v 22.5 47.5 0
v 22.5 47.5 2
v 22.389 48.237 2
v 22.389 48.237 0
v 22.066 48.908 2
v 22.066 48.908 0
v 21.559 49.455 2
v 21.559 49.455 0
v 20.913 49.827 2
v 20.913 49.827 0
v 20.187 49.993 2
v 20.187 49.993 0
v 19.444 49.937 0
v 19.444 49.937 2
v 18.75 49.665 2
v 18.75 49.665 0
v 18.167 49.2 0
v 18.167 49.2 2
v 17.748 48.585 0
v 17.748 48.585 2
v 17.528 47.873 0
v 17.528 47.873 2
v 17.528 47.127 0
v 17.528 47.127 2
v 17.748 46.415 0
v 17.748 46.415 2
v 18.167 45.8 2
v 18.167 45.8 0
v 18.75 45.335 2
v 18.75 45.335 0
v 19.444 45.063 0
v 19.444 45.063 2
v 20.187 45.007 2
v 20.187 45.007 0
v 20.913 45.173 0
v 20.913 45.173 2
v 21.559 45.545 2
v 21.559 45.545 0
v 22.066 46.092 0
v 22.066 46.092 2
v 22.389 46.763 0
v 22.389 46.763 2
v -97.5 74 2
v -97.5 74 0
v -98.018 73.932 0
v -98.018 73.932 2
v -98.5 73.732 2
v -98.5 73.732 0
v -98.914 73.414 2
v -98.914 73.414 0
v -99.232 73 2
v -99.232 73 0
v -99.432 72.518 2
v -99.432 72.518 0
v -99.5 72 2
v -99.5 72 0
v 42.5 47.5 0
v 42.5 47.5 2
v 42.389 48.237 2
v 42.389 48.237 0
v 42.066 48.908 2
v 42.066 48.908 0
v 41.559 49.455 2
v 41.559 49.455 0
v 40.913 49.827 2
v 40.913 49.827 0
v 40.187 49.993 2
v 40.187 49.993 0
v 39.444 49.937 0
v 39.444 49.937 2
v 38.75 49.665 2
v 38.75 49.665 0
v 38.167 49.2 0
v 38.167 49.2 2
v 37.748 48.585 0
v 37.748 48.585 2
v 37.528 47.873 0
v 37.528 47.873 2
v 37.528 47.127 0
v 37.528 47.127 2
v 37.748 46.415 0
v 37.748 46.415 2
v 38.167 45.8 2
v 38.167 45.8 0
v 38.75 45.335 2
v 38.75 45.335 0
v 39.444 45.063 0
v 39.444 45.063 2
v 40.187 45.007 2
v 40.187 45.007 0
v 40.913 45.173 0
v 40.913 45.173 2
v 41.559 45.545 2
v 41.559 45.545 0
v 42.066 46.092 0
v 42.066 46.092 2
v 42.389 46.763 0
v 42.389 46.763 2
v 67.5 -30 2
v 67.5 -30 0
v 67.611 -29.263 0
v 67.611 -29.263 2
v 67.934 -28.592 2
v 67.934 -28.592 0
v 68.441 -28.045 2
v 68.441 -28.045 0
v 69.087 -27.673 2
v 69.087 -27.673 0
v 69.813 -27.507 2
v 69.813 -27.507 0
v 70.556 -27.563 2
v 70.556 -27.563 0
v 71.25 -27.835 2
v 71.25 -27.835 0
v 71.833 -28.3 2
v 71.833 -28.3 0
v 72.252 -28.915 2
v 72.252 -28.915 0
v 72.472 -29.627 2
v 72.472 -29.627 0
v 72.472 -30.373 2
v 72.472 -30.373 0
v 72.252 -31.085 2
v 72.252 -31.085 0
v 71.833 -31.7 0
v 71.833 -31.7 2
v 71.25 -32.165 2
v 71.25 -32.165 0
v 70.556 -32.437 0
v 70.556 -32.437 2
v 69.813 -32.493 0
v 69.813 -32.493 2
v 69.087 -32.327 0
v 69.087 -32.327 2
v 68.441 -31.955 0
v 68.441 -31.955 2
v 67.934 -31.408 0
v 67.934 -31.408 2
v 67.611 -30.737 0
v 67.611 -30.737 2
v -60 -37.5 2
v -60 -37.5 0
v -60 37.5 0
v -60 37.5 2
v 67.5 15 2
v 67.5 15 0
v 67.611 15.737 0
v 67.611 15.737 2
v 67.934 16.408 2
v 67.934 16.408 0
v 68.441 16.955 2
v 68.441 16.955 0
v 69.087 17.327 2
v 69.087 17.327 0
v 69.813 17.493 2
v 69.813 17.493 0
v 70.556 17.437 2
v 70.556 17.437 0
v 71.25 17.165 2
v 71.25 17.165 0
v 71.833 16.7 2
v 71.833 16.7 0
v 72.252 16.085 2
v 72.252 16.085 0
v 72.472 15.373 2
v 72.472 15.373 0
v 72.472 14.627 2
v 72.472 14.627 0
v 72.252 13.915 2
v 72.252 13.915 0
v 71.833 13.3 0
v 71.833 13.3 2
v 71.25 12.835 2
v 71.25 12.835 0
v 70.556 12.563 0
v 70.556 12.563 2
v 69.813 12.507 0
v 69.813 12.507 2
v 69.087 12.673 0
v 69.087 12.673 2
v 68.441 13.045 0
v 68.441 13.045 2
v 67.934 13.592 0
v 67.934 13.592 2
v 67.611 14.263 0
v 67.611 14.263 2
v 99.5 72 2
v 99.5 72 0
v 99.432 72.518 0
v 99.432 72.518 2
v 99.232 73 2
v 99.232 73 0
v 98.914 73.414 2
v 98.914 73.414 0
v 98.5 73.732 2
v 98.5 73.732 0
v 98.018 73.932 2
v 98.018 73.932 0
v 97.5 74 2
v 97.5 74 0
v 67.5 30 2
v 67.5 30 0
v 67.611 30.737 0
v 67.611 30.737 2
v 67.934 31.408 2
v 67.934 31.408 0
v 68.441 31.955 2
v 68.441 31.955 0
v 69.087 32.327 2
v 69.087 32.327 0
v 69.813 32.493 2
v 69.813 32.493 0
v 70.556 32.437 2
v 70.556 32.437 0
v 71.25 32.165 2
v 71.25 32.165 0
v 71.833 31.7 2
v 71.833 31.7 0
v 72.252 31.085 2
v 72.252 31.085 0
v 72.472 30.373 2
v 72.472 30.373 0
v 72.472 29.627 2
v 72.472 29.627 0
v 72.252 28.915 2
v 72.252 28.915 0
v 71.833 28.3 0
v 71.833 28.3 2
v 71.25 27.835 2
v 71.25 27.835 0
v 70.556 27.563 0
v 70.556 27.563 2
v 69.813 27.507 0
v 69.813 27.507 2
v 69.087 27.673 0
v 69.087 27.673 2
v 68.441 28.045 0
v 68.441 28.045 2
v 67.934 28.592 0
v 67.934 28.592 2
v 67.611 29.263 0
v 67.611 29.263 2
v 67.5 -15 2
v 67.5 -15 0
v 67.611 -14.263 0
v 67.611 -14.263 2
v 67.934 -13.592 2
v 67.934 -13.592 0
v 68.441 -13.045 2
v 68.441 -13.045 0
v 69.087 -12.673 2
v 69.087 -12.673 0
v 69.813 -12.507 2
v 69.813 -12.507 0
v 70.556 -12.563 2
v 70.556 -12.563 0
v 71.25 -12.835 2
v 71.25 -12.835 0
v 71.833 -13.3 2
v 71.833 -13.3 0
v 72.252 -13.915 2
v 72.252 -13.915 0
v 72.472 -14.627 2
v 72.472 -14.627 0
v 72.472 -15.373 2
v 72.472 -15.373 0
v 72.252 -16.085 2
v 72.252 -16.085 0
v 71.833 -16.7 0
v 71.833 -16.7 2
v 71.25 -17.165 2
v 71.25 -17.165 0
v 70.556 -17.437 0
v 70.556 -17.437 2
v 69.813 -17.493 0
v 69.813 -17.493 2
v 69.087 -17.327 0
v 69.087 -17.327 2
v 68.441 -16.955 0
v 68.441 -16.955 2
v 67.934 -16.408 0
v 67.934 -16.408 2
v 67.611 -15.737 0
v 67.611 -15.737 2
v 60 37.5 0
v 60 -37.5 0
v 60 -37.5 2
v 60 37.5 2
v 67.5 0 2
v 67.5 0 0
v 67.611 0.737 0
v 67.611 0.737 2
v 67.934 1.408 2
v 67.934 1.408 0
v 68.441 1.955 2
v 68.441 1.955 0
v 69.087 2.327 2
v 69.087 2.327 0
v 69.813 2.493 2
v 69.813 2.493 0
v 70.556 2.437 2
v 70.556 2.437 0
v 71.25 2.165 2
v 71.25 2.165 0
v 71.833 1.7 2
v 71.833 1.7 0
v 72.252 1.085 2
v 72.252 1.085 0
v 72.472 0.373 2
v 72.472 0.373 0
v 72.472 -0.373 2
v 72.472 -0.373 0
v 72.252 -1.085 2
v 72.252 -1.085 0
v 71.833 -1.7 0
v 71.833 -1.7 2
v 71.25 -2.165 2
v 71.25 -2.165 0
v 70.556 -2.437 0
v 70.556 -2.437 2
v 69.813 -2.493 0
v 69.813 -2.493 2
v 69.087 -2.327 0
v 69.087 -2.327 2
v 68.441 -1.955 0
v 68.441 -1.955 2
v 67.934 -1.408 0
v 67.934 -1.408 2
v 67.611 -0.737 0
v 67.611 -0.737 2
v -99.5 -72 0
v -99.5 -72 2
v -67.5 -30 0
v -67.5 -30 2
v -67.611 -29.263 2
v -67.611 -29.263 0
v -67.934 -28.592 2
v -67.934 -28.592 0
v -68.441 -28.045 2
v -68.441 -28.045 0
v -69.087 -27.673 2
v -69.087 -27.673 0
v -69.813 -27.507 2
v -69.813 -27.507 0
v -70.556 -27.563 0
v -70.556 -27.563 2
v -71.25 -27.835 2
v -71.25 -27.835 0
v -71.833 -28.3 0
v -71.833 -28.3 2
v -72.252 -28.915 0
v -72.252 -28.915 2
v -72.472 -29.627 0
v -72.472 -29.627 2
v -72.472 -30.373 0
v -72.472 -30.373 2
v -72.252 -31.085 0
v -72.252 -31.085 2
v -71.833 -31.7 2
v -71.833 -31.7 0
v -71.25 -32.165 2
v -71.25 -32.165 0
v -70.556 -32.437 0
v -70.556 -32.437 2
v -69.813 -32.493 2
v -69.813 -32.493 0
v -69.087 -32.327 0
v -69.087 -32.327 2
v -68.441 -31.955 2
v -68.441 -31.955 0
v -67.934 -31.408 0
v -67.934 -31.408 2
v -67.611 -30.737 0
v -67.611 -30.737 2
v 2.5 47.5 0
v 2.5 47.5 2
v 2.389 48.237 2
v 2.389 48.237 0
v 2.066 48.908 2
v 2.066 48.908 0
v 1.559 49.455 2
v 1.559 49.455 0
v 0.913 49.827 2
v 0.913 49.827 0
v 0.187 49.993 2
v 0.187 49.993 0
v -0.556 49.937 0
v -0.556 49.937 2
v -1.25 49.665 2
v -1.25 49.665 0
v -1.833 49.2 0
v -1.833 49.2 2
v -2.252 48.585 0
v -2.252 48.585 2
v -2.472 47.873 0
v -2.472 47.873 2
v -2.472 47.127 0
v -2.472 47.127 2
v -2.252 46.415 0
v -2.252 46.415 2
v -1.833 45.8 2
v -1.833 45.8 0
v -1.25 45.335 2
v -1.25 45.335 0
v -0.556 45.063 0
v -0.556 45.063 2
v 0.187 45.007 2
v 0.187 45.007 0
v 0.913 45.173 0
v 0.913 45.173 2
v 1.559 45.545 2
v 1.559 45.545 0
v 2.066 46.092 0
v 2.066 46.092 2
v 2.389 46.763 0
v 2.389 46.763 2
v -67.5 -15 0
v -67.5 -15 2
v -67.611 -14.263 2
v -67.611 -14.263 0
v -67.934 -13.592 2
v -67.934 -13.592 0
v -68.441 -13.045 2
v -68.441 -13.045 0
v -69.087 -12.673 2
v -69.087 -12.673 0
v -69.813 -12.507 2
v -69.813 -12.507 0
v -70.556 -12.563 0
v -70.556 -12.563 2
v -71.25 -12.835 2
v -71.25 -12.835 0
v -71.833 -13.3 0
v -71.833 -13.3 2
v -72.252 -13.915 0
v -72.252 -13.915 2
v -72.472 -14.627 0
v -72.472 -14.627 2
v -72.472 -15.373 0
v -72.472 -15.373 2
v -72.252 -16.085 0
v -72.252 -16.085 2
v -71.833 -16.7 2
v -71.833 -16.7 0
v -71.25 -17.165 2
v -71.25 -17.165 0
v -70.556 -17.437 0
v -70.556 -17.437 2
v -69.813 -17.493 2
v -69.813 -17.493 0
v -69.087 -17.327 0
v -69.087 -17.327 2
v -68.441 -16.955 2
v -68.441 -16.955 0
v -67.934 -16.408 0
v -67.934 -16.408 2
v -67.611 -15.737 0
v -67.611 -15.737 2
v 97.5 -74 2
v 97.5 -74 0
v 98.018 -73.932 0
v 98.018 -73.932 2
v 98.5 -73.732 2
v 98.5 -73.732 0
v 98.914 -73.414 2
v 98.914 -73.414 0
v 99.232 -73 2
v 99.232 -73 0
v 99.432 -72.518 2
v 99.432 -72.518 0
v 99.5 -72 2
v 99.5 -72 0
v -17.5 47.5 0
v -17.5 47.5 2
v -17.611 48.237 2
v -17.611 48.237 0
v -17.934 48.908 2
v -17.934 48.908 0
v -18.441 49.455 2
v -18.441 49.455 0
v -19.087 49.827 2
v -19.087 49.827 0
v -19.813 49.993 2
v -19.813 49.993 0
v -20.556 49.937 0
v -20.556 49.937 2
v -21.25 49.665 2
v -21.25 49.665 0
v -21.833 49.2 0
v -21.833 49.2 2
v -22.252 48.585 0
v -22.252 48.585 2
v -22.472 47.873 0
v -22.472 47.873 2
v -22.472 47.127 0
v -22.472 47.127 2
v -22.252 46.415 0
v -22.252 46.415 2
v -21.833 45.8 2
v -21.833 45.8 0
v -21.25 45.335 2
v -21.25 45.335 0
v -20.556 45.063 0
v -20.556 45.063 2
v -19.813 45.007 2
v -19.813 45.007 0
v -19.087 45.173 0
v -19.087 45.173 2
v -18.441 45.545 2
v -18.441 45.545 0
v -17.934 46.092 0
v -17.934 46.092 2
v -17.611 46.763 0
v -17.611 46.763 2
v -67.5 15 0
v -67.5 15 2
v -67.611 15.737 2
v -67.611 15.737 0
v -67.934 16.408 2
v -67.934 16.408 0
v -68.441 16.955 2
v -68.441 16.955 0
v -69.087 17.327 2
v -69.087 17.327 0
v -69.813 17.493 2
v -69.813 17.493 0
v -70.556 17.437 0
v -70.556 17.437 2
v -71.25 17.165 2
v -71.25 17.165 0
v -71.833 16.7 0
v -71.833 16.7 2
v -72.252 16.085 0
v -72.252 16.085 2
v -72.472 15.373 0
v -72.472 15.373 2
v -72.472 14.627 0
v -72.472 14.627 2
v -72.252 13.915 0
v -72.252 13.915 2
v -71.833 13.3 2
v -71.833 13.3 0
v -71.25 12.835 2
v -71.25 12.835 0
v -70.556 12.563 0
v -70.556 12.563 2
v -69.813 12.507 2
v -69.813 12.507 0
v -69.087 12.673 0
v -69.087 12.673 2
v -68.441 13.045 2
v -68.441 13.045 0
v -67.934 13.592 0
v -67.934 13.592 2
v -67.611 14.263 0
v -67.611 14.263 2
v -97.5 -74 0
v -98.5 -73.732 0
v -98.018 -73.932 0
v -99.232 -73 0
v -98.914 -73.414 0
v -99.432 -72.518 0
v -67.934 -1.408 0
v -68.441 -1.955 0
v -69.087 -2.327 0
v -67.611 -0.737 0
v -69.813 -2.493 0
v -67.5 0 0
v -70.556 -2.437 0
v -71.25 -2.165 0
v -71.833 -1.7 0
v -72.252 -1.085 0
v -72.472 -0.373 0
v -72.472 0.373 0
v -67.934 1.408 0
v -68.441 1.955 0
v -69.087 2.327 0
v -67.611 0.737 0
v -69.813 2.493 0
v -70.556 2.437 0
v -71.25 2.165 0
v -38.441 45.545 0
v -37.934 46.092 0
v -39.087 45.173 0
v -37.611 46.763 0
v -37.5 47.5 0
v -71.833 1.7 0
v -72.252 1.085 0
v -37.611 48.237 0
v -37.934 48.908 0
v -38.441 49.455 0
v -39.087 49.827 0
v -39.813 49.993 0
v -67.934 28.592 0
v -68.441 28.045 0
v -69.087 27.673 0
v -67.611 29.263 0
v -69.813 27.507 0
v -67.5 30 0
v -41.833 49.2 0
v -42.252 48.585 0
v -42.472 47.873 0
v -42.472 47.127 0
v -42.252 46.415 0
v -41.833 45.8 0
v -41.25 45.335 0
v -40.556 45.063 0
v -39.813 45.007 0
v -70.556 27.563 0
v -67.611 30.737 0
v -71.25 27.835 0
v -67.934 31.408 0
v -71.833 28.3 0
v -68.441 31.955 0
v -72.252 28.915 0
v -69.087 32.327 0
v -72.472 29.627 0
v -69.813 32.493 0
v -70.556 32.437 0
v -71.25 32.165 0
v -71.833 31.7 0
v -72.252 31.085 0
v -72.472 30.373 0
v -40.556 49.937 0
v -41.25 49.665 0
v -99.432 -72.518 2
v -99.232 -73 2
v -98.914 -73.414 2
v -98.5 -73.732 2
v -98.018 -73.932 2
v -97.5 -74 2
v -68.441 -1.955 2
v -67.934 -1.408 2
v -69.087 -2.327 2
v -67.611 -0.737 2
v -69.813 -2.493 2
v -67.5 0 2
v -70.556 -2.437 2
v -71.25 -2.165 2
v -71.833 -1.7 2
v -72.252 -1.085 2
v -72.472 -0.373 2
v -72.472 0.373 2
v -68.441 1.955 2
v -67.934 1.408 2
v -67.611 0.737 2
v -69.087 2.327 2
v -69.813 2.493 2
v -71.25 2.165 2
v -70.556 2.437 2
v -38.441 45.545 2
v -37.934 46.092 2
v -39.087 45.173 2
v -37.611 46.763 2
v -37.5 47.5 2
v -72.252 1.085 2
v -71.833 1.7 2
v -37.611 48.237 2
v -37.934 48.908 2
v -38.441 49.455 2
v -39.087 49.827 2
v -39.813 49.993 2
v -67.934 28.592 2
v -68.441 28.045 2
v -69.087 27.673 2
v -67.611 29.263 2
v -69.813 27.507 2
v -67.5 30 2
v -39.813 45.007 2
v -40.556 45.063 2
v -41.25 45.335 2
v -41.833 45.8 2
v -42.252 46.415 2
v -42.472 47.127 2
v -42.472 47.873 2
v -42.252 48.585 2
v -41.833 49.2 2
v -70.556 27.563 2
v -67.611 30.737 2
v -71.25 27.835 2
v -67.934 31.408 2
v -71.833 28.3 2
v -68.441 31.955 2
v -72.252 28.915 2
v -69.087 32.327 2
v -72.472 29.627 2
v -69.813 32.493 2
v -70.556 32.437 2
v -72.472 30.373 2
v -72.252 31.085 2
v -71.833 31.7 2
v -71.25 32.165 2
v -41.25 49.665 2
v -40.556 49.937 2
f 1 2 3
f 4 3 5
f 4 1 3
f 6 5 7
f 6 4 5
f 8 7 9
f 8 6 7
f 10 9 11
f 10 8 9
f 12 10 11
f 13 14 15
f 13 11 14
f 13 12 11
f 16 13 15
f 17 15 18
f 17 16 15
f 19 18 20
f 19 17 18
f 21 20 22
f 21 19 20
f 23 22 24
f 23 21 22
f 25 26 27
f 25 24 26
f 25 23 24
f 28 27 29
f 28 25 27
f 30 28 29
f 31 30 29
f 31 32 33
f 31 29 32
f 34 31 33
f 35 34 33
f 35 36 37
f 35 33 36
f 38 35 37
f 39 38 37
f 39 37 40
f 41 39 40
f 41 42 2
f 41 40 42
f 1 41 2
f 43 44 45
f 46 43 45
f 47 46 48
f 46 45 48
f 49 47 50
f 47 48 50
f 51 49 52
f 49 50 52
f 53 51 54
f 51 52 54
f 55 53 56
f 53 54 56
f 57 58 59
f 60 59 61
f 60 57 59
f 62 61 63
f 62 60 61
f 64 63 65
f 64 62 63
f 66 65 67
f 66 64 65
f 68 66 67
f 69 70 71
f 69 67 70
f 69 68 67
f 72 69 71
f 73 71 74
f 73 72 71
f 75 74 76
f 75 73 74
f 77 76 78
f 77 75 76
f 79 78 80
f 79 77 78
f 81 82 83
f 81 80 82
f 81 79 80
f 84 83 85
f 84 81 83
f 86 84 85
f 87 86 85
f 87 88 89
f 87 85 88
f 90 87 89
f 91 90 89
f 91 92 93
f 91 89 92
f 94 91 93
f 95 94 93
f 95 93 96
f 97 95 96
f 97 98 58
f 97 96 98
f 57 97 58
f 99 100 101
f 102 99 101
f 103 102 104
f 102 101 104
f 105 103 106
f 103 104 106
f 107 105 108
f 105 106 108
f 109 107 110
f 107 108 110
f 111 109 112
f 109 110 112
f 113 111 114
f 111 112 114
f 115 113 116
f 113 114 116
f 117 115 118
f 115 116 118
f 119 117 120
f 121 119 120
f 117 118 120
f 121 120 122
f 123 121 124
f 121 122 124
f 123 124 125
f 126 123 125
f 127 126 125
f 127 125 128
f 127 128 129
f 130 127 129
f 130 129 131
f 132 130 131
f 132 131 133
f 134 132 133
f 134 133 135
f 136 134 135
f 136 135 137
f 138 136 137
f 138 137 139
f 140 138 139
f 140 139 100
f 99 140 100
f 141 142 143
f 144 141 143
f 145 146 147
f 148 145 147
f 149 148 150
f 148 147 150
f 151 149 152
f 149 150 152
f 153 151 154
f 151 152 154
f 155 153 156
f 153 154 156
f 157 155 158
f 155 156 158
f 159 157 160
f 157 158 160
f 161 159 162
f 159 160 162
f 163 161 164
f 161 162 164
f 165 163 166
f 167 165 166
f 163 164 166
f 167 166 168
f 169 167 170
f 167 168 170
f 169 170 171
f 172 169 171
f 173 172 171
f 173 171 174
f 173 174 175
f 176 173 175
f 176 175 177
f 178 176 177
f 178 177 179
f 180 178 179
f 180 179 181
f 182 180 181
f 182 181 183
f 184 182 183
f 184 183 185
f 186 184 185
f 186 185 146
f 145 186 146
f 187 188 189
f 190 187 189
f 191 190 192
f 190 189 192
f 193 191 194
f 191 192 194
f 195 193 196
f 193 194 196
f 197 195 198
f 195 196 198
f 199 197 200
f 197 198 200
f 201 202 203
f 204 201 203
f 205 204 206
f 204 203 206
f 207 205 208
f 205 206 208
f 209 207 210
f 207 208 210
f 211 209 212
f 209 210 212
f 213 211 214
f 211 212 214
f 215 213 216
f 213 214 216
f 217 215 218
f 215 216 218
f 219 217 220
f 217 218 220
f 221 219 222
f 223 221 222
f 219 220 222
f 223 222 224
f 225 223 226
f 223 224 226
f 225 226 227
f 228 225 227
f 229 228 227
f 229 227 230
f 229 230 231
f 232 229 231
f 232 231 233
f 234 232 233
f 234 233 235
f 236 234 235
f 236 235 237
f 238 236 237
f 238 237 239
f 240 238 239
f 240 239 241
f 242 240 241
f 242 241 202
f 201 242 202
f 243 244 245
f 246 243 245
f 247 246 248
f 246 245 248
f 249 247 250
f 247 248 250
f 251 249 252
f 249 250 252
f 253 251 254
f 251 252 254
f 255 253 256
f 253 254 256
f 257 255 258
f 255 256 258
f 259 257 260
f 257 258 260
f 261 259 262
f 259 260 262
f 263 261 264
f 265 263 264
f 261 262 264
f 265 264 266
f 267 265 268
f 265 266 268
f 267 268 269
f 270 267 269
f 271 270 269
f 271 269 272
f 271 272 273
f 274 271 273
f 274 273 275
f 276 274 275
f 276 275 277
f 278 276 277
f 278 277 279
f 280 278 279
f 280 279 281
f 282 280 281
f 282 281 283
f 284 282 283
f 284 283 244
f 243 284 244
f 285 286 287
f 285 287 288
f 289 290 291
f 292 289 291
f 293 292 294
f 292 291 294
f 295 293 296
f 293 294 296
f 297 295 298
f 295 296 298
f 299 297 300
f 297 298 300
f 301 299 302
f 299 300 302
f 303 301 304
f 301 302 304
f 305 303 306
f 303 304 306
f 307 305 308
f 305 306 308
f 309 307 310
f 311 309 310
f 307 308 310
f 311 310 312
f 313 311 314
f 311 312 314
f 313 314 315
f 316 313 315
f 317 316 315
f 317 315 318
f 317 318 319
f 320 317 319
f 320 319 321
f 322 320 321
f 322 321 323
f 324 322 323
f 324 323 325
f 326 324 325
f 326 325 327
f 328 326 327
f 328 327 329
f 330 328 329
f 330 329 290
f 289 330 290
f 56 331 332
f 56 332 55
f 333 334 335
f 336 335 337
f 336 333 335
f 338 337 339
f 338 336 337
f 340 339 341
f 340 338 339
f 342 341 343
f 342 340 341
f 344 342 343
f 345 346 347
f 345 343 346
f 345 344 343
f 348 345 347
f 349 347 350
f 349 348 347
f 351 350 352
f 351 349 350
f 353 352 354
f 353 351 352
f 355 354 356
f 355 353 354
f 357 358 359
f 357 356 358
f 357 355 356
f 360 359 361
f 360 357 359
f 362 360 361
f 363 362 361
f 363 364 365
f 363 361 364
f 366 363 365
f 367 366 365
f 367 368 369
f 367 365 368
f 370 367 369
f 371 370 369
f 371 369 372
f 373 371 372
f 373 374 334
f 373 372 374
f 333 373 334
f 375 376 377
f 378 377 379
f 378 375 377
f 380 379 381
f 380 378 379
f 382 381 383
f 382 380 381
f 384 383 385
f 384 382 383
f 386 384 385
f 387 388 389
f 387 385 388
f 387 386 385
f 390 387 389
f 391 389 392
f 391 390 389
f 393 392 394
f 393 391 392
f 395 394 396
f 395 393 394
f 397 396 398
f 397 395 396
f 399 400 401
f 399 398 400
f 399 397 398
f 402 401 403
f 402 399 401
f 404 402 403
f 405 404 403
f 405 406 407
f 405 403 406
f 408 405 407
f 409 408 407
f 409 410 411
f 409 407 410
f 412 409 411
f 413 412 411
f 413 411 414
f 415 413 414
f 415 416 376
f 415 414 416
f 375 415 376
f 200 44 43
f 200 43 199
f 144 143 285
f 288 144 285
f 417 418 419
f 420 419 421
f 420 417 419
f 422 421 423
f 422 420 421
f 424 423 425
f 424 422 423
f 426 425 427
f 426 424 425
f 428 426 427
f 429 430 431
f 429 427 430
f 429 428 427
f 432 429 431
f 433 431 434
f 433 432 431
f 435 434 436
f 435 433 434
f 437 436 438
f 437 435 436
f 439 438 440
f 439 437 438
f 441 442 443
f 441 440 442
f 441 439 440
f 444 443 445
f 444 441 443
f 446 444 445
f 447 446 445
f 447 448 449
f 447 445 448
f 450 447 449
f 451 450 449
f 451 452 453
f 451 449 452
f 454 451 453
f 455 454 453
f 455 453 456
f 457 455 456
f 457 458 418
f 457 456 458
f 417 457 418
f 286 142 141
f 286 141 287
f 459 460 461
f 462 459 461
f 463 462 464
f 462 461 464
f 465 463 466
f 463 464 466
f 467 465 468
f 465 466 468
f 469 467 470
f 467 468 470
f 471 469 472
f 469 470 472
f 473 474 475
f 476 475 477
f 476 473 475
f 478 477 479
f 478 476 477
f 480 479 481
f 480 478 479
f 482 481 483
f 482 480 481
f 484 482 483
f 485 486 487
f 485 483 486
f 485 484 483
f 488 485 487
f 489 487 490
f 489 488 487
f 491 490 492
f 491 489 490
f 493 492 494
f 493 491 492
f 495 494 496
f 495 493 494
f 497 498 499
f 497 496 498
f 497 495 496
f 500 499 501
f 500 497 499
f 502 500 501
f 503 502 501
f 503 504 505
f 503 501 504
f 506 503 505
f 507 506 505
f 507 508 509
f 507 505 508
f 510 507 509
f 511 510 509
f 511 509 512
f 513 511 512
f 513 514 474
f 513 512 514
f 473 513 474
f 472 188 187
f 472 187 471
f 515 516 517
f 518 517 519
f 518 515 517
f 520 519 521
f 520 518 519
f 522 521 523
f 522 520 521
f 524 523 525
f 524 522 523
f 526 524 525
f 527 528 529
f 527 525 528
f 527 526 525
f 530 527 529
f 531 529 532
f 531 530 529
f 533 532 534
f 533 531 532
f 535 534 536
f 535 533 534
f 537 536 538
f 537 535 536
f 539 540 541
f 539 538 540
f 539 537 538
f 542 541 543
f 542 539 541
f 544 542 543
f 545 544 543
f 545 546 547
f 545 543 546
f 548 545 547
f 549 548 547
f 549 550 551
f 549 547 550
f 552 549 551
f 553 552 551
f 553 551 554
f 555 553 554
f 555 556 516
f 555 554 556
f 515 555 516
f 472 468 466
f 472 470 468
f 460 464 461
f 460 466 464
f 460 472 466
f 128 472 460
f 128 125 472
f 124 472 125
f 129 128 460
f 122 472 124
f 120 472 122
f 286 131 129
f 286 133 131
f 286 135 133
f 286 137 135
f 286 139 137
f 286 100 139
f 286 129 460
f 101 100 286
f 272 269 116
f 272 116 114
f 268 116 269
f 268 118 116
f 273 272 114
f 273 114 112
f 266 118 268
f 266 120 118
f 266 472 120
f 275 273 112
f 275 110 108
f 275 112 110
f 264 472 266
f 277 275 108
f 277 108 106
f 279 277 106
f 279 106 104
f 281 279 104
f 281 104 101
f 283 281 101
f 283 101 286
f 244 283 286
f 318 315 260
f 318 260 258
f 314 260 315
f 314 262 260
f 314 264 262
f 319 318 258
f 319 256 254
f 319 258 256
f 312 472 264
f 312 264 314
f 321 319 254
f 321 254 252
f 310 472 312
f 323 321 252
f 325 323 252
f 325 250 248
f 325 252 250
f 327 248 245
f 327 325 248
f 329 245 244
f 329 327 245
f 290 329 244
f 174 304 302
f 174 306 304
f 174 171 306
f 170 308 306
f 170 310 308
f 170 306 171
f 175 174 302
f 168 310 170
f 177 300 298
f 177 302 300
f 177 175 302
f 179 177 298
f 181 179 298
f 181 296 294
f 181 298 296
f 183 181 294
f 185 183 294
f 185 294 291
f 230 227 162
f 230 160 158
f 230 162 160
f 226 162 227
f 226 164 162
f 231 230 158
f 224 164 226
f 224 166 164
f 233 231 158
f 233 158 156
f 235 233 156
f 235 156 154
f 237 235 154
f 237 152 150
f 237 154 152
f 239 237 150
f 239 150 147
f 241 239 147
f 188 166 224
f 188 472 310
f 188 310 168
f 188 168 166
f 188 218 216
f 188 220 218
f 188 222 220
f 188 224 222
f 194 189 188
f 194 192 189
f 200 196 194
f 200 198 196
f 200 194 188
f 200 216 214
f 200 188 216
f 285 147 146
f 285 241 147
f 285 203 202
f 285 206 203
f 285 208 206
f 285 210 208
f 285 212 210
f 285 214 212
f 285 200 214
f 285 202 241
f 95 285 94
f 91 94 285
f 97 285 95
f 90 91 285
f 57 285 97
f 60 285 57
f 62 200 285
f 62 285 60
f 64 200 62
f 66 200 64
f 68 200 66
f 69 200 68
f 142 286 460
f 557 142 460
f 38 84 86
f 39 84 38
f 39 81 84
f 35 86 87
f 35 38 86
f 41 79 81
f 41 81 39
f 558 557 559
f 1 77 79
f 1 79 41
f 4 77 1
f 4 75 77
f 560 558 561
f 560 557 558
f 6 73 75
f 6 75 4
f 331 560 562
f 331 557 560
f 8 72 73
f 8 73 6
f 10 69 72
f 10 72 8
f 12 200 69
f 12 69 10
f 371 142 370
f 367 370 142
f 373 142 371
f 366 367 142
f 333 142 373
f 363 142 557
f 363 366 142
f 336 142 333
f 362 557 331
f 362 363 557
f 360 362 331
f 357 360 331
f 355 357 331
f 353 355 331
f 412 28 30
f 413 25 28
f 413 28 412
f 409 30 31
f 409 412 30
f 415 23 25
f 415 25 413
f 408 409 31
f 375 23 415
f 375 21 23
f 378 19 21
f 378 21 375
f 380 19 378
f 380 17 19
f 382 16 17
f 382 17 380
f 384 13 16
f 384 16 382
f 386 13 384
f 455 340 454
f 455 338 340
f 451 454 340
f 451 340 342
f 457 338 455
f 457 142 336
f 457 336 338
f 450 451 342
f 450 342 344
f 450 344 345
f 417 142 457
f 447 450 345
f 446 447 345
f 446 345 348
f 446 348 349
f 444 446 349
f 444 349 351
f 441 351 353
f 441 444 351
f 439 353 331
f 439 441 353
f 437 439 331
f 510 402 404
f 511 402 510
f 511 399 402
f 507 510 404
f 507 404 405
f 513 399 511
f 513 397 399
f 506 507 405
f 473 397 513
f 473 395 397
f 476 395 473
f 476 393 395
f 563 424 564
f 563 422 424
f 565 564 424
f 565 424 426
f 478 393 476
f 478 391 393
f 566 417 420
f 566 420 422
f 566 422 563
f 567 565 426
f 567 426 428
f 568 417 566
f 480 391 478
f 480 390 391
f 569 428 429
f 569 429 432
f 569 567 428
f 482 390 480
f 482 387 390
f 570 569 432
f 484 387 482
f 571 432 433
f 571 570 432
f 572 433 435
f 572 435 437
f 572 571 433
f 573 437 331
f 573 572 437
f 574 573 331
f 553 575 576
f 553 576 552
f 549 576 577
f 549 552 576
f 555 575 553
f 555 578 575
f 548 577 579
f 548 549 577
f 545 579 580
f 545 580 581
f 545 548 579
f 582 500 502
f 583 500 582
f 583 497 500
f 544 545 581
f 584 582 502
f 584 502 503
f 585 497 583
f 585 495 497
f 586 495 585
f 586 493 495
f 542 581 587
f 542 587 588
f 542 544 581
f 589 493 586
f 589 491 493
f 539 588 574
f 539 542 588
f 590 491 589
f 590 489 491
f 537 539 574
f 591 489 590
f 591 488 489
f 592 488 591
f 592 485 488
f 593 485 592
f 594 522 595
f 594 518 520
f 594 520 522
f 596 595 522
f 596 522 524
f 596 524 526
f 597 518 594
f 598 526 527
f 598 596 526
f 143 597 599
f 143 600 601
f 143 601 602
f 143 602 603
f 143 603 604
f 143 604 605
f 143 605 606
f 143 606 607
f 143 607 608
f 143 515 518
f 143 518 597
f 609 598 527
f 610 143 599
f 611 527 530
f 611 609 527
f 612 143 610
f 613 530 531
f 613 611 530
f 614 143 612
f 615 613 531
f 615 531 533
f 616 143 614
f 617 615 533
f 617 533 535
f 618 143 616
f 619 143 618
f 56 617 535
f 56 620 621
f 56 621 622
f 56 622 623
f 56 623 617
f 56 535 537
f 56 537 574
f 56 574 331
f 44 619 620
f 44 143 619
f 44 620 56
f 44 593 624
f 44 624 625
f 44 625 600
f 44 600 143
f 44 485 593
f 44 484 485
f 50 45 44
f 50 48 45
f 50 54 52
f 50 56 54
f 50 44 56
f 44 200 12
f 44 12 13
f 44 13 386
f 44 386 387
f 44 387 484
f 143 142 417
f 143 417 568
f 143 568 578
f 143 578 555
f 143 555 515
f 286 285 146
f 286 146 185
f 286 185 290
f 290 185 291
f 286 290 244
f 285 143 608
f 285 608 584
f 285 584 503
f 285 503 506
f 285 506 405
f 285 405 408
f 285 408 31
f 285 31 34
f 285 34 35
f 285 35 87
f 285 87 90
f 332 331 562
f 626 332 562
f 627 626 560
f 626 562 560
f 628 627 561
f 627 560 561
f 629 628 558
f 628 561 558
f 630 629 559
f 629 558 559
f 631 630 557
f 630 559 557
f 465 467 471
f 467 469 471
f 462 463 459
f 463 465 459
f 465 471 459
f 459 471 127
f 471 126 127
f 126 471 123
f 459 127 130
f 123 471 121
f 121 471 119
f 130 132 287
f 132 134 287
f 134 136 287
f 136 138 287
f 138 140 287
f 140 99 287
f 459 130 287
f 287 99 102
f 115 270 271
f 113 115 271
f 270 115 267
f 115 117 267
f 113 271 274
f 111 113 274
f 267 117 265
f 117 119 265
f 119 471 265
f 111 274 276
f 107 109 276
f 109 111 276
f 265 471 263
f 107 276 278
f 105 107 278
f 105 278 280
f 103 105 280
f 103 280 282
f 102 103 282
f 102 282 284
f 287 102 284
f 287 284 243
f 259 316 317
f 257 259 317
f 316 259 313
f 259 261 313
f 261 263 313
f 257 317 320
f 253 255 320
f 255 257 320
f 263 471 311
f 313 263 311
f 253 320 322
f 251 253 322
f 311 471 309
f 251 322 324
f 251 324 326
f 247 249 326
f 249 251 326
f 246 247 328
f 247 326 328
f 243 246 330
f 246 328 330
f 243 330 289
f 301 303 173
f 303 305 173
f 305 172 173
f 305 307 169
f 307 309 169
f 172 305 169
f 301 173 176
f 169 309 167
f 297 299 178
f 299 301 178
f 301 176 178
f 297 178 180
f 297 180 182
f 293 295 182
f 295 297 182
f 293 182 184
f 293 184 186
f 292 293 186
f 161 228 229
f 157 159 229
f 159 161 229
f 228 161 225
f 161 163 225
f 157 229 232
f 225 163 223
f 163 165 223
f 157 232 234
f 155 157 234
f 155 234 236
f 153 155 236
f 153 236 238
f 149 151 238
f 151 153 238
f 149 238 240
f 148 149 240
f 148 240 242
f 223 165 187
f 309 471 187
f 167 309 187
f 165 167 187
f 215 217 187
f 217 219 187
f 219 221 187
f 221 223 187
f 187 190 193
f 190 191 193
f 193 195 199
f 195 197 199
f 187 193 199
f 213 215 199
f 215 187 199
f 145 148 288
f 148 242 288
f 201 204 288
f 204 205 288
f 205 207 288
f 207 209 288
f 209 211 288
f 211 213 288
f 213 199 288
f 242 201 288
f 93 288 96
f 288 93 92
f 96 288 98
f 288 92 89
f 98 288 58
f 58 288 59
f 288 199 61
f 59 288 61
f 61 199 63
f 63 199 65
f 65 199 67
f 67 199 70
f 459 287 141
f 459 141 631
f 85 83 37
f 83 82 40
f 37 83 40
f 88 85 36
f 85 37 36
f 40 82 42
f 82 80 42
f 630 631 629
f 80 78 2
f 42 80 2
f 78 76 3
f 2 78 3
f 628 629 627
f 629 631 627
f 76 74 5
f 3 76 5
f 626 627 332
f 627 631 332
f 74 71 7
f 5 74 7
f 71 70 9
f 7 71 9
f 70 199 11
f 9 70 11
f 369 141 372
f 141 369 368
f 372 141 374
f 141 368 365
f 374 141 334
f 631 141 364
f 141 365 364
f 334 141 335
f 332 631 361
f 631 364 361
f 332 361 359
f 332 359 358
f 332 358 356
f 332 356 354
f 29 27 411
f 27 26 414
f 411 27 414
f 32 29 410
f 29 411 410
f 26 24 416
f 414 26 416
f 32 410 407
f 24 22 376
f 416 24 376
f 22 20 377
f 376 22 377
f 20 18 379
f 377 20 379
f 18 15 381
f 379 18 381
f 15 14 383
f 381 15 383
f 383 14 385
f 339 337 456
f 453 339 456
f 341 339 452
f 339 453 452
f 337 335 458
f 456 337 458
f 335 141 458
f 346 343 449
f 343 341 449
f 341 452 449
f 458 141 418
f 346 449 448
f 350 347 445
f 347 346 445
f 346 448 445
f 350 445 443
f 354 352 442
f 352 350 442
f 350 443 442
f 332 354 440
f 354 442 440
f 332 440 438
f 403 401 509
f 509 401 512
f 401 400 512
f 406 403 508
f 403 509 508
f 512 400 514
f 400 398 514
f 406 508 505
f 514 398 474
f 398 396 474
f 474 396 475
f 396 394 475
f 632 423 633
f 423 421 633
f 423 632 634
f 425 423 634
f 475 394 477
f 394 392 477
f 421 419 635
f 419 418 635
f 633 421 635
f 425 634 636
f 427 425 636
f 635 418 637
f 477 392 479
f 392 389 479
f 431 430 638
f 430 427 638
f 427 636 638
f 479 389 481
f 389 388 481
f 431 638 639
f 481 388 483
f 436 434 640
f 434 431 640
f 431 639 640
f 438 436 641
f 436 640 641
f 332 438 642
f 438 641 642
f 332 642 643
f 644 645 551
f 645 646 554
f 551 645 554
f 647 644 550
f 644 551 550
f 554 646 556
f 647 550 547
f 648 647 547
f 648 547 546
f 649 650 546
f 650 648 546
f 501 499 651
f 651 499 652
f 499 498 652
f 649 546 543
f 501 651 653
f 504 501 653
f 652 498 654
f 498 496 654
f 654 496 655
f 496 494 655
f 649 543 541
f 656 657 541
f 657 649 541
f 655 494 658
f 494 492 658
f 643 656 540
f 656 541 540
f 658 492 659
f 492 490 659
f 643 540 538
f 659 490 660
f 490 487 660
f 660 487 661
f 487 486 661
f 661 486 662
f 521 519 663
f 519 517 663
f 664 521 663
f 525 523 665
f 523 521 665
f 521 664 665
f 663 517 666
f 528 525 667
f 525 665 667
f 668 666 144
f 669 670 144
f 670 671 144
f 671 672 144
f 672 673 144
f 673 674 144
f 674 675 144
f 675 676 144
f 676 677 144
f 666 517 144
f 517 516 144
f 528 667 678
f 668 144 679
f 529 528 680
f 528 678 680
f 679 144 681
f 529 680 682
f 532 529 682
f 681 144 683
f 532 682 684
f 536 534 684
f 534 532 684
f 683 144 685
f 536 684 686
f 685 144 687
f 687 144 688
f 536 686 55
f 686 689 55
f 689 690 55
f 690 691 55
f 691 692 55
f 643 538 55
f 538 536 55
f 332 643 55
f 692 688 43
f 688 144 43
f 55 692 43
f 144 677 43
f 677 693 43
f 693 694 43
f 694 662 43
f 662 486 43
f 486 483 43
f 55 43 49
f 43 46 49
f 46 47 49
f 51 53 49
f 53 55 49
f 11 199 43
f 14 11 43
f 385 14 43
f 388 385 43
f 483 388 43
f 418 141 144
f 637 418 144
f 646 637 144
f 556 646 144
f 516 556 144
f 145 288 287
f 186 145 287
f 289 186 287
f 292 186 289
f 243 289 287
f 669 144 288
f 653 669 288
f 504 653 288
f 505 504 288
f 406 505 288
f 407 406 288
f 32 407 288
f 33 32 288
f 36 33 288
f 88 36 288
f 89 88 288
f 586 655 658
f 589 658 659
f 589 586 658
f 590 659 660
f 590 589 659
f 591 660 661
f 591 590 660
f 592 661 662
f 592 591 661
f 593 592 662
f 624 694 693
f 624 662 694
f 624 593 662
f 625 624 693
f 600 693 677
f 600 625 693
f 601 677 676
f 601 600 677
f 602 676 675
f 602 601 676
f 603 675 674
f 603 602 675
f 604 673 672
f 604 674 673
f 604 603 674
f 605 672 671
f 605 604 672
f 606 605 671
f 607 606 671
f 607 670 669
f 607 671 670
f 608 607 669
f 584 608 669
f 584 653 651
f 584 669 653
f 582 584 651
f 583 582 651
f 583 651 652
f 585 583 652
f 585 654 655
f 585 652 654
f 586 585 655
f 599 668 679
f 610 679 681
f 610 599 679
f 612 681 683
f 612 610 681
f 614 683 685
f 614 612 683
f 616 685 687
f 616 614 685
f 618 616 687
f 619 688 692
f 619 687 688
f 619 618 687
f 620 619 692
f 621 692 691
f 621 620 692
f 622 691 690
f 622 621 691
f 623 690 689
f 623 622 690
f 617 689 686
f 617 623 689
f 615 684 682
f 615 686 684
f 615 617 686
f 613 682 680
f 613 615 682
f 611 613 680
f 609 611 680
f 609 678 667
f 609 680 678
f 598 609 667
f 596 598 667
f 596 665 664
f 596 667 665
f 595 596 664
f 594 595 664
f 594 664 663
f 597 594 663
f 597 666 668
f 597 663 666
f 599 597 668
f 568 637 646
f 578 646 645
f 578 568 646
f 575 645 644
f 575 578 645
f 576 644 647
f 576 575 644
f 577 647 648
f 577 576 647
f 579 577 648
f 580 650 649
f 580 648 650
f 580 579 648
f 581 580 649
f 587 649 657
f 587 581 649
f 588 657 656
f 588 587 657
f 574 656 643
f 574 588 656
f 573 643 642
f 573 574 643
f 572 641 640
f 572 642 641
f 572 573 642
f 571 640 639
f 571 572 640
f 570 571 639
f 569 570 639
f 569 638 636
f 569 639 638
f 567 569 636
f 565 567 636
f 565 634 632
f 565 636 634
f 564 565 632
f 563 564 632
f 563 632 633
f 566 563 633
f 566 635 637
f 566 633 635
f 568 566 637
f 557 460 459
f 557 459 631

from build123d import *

# Parameters (mm, degrees)
PAD_DEPTH       = 2
SKETCH001_W     = 120
SKETCH001_H     = 75
POCKET_DEPTH    = 7
SKETCH002_R     = 2.5
POCKET001_DEPTH = 7
SKETCH003_R     = 2.5
POCKET002_DEPTH = 7


with BuildPart() as part:
    # Sketch → Pad (new body)
    with BuildSketch(Plane.XY):
        with BuildLine():
            Line((-97.5, 74), (97.5, 74))
            ThreePointArc((99.5, 72), (98.914214, 73.414214), (97.5, 74))
            Line((99.5, 72), (99.5, -72))
            ThreePointArc((97.5, -74), (98.914214, -73.414214), (99.5, -72))
            Line((97.5, -74), (-97.5, -74))
            ThreePointArc((-99.5, -72), (-98.914214, -73.414214), (-97.5, -74))
            Line((-99.5, -72), (-99.5, 72))
            ThreePointArc((-97.5, 74), (-98.914214, 73.414214), (-99.5, 72))
        make_face()
    extrude(amount=PAD_DEPTH)

    # Sketch001 → Pocket (cut)
    with BuildSketch(Plane.XY):
        Rectangle(SKETCH001_W, SKETCH001_H)
    extrude(amount=POCKET_DEPTH, mode=Mode.SUBTRACT)

    # Sketch002 → Pocket001 (cut)
    with BuildSketch(Plane.XY):
        with Locations((0, 47.5)):
            Circle(SKETCH002_R)
        with Locations((-40, 47.5)):
            Circle(SKETCH002_R)
        with Locations((-20, 47.5)):
            Circle(SKETCH002_R)
        with Locations((20, 47.5)):
            Circle(SKETCH002_R)
        with Locations((40, 47.5)):
            Circle(SKETCH002_R)
    extrude(amount=POCKET001_DEPTH, mode=Mode.SUBTRACT)

    # Sketch003 → Pocket002 (cut)
    with BuildSketch(Plane.XY):
        with Locations((-70, 0)):
            Circle(SKETCH003_R)
        with Locations((-70, 15)):
            Circle(SKETCH003_R)
        with Locations((-70, 30)):
            Circle(SKETCH003_R)
        with Locations((-70, -15)):
            Circle(SKETCH003_R)
        with Locations((-70, -30)):
            Circle(SKETCH003_R)
    pocket002 = extrude(amount=POCKET002_DEPTH, mode=Mode.SUBTRACT)

    # Mirrored: Pocket002 across Sketch003 V_Axis
    add(pocket002.mirror(Plane(origin=(0, 0, 0), x_dir=(0, 0, 1), z_dir=(1, 0, 0))), mode=Mode.SUBTRACT)


solid = part.part
